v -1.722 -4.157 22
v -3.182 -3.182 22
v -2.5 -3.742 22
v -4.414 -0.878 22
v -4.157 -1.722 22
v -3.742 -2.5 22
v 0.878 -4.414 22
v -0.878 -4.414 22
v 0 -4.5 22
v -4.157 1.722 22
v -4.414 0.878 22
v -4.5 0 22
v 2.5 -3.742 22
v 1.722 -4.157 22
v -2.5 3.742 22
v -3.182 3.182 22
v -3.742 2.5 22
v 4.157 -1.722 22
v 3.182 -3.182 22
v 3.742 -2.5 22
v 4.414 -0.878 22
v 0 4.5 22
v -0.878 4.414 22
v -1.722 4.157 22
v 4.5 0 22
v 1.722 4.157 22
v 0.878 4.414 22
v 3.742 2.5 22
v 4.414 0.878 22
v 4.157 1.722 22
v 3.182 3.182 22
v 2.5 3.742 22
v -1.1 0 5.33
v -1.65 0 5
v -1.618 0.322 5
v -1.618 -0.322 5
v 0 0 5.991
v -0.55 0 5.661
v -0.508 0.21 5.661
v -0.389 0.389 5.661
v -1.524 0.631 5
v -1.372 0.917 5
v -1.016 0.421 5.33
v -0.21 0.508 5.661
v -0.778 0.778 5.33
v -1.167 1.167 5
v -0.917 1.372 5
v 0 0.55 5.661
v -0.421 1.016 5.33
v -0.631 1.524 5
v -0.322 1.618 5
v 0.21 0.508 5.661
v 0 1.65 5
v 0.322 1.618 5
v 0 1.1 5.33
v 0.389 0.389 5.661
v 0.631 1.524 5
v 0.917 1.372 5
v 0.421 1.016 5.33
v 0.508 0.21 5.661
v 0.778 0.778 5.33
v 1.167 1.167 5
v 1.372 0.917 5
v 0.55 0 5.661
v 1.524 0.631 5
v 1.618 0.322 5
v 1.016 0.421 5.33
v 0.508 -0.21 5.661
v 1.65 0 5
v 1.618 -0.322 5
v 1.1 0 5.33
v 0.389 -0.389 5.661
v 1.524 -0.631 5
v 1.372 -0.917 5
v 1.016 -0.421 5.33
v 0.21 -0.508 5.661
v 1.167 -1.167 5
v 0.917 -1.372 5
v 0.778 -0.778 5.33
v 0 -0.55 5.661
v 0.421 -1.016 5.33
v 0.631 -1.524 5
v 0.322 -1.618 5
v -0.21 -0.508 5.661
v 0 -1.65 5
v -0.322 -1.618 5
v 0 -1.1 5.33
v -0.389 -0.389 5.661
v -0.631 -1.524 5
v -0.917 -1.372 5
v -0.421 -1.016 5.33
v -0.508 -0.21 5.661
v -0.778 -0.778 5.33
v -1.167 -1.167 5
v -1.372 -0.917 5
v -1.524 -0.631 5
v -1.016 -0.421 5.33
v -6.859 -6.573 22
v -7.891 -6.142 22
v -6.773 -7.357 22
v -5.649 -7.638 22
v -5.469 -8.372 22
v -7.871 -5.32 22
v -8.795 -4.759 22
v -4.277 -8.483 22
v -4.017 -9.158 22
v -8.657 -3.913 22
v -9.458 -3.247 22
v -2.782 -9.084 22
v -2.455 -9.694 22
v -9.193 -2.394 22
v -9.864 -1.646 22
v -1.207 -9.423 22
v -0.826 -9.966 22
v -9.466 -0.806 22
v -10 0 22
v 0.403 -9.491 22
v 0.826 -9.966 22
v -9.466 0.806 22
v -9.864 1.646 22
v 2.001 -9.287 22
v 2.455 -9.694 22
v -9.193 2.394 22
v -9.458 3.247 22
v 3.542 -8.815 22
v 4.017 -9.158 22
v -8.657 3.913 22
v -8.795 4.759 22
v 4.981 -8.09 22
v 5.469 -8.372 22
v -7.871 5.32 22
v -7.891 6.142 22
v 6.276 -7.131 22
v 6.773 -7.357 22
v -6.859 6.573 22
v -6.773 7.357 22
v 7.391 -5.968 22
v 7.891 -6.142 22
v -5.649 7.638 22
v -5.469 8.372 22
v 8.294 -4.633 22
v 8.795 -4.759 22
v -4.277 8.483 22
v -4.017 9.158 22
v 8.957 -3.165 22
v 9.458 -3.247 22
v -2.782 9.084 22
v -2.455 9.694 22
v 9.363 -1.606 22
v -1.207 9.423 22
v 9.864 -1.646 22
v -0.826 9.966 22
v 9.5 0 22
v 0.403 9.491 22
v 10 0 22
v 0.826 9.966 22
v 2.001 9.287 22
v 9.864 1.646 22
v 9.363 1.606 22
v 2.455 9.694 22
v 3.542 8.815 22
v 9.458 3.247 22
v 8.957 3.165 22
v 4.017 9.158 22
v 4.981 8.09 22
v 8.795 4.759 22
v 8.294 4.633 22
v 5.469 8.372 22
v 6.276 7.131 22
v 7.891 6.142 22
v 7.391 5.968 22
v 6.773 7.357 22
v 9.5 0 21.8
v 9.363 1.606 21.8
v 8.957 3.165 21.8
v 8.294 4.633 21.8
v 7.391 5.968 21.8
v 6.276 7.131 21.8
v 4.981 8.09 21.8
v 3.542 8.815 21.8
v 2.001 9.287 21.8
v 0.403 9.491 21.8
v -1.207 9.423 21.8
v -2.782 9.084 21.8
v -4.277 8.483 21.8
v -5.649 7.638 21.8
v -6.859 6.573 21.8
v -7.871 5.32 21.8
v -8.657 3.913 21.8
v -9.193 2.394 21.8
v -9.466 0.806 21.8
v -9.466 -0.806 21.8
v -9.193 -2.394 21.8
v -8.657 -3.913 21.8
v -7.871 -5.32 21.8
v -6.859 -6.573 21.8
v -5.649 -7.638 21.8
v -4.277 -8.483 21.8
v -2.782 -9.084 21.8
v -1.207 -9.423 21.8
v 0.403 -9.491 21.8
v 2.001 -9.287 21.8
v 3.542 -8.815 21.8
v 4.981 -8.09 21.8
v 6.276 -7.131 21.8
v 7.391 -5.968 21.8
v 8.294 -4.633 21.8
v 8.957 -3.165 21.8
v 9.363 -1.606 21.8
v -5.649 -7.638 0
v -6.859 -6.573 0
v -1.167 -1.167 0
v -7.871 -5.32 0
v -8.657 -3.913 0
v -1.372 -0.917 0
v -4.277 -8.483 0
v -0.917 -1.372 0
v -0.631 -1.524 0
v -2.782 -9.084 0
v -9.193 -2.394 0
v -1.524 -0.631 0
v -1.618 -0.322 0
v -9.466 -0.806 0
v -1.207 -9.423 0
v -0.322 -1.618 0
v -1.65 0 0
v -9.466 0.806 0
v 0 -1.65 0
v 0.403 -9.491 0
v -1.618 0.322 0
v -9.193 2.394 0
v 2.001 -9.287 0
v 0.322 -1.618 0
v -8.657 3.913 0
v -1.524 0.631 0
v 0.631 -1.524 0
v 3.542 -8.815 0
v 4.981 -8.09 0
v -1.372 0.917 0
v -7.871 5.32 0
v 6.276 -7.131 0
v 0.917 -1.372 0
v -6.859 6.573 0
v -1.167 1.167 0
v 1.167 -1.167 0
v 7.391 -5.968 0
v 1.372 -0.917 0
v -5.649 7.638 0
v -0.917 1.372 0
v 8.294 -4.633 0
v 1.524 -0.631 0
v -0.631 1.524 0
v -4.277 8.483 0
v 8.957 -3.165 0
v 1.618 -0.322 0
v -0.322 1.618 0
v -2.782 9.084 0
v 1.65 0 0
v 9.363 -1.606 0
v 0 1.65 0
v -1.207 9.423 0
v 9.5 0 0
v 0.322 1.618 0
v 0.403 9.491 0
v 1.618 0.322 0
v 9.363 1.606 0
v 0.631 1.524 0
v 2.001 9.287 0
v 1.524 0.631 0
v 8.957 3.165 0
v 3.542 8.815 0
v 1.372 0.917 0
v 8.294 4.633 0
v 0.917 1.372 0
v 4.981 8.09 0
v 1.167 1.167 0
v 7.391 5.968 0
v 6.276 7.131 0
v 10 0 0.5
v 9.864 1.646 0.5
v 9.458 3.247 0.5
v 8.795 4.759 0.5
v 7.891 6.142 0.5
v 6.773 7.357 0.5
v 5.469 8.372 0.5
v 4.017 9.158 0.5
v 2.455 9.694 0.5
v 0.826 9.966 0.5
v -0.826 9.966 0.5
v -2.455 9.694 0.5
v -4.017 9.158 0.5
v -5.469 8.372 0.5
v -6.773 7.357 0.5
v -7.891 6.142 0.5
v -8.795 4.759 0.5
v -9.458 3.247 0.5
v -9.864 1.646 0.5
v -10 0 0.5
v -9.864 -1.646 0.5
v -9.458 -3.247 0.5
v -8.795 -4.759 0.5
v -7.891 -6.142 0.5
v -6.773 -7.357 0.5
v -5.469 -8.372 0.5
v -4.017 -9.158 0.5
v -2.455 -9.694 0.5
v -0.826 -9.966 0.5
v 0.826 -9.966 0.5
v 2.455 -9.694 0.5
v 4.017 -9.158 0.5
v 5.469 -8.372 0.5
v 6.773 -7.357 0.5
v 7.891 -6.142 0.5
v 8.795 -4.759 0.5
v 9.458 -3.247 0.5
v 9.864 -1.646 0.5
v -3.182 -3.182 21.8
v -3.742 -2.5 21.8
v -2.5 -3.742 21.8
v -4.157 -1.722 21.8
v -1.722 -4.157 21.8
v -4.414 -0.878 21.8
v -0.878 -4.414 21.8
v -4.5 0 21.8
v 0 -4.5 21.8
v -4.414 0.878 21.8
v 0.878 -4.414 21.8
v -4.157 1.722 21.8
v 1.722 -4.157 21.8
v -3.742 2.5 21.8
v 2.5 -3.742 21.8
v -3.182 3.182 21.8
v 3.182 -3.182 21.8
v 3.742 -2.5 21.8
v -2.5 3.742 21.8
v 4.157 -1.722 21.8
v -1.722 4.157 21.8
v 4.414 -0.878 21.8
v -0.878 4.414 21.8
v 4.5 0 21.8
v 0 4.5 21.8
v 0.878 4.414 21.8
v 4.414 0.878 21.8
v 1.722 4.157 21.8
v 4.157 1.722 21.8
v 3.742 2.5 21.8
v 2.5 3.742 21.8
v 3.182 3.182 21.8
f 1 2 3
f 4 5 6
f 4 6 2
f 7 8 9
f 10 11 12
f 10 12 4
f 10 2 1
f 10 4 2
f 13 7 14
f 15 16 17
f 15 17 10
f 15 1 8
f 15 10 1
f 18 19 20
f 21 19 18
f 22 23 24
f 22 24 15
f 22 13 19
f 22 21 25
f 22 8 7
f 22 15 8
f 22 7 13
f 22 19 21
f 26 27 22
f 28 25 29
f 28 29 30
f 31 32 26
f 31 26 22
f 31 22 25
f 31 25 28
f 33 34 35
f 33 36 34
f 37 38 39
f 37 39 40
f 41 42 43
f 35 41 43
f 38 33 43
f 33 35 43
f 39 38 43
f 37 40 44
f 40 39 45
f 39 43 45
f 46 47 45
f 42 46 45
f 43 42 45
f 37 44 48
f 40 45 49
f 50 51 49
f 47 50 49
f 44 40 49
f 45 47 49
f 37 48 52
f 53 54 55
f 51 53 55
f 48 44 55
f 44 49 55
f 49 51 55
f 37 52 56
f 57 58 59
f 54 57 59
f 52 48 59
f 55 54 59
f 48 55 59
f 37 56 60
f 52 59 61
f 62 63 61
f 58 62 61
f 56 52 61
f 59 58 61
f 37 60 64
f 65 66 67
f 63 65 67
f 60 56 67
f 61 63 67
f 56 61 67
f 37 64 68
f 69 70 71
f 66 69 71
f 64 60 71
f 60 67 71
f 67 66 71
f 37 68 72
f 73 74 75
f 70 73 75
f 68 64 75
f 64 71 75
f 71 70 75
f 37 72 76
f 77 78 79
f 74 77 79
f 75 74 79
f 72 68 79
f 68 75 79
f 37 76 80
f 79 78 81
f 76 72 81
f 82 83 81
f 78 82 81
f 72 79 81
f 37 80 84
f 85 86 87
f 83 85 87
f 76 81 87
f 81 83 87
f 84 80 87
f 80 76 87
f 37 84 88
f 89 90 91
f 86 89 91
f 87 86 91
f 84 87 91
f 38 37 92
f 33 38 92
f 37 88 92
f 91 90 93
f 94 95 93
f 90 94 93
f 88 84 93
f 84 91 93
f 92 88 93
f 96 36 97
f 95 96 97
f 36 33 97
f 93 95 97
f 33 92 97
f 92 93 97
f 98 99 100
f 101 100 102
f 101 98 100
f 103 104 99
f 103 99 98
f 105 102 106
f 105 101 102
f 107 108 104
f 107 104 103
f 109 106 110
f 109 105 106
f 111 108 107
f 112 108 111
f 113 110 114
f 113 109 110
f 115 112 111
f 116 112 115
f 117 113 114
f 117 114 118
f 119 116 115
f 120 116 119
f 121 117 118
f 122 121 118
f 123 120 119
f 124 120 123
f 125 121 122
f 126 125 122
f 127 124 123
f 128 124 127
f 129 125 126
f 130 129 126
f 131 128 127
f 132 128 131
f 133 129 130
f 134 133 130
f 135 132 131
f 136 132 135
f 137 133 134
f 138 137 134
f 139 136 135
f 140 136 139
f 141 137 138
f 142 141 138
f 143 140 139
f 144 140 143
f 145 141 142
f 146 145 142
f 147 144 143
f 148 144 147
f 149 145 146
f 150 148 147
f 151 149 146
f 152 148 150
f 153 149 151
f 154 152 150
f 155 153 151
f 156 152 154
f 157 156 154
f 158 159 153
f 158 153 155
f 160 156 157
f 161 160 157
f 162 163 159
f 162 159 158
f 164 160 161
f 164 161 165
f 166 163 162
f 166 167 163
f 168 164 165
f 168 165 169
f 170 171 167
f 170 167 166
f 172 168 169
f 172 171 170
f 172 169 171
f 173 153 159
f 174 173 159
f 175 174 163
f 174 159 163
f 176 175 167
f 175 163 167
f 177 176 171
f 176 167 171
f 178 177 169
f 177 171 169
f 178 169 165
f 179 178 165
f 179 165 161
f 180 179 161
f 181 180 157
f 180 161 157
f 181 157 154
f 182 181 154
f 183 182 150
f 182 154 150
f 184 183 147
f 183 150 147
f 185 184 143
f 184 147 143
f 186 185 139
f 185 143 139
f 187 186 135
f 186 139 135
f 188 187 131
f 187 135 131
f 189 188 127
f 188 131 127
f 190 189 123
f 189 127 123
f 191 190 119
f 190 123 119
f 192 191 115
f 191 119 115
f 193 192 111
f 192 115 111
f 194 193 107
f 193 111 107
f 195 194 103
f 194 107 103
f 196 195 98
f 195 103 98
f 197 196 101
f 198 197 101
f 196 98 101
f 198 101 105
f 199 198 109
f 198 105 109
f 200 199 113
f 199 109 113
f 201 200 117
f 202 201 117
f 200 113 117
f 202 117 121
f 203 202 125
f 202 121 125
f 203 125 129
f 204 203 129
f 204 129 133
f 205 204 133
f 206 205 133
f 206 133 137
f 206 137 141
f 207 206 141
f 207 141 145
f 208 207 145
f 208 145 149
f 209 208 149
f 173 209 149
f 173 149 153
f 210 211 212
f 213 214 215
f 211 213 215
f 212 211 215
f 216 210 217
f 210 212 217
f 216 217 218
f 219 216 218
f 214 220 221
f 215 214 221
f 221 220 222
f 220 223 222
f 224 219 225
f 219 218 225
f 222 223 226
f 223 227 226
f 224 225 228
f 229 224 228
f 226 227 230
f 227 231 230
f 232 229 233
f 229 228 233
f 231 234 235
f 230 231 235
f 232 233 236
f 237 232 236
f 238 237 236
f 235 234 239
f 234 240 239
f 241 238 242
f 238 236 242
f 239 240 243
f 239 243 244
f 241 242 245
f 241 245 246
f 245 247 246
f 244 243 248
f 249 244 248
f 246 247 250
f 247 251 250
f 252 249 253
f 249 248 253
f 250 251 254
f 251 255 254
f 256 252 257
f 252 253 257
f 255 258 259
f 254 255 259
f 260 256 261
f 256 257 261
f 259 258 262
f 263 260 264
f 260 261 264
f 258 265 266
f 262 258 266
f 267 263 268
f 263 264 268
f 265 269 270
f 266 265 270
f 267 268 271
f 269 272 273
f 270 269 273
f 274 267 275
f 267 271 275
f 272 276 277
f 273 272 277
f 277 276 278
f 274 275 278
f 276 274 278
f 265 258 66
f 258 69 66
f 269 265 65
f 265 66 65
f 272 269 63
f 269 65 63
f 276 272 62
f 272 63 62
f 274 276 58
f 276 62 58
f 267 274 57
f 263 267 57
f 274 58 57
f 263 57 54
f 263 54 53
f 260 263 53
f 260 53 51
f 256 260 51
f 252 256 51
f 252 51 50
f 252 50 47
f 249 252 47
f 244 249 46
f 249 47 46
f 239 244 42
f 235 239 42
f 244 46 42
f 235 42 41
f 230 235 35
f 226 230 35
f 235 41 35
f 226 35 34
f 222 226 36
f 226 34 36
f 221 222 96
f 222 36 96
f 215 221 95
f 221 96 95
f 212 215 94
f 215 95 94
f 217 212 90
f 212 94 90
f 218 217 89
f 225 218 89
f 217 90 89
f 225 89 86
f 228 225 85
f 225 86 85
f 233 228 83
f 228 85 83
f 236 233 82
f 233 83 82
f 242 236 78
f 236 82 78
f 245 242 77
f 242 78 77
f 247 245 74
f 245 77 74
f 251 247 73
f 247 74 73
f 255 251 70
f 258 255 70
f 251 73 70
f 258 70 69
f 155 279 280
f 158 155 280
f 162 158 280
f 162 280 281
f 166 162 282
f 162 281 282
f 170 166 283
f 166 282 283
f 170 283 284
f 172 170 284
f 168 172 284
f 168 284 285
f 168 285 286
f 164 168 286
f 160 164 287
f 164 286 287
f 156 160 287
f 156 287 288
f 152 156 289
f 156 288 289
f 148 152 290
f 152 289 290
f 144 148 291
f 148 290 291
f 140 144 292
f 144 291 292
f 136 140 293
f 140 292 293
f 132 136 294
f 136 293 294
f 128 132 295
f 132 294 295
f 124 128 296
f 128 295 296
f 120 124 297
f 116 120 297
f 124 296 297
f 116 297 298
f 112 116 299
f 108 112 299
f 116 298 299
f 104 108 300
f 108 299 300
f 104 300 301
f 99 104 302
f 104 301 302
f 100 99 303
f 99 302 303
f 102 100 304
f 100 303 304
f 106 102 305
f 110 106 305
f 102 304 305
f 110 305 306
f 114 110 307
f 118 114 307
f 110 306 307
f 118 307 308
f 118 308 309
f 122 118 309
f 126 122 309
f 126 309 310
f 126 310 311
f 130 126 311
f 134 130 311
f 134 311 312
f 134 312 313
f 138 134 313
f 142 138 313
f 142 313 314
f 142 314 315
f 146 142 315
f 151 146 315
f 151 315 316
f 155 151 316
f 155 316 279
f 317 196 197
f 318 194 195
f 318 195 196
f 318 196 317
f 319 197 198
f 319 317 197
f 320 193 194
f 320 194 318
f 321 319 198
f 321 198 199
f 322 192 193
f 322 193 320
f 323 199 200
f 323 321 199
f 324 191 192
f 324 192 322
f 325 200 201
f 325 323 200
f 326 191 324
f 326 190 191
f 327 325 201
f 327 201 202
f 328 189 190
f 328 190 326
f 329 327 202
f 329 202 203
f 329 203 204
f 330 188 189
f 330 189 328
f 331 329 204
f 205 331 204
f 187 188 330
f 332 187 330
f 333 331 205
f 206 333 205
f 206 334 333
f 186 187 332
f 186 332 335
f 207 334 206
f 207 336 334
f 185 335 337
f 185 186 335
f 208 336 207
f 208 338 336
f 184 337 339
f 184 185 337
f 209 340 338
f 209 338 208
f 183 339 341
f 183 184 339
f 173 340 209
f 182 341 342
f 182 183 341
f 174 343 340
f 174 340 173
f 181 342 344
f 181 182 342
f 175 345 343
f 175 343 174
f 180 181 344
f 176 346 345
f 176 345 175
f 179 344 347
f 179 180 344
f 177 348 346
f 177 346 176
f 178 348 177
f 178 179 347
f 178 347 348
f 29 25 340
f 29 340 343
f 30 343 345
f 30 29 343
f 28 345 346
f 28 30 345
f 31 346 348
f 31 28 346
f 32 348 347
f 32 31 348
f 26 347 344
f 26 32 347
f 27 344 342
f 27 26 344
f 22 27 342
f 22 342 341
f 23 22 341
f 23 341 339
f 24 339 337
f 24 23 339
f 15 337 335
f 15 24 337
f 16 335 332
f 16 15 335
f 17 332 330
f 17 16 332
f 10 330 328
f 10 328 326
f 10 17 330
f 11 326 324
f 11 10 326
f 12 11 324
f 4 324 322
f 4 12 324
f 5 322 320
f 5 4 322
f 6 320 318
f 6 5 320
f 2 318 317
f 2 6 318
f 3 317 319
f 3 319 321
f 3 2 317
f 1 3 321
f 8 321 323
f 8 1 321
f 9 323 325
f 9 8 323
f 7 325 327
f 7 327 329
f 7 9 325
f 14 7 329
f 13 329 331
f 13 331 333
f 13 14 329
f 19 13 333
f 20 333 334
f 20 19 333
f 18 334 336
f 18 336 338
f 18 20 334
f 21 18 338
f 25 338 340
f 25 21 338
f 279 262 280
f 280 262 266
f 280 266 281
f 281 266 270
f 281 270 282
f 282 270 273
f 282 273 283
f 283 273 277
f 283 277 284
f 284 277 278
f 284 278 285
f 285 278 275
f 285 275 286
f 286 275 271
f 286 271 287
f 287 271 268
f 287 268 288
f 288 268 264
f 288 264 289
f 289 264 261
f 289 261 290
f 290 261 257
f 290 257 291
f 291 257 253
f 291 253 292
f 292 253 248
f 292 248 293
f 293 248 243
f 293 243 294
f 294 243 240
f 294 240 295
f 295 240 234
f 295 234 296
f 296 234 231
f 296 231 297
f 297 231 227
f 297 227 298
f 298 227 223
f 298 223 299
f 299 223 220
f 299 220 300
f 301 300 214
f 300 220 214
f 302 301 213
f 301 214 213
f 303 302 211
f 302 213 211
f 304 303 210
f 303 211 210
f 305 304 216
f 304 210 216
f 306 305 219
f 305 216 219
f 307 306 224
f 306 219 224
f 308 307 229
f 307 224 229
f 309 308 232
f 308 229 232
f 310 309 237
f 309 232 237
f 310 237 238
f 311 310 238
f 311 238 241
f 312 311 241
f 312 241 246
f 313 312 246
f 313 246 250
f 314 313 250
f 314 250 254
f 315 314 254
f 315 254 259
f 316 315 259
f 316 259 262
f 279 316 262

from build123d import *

# Parameters (mm, degrees)
SKETCH1_R             = 10
BOSS_EXTRUDE1_DEPTH   = 22
SKETCH2_R             = 9.5
SKETCH2_R_2           = 4.5
CUT_EXTRUDE1_DEPTH    = 0.2
M4_TAPPED_HOLE1_D     = 3.3
M4_TAPPED_HOLE1_DEPTH = 5
M4_TAPPED_HOLE1_TIP   = 0.991420021
CHAMFER2_SIZE         = 0.5


with BuildPart() as part:
    # Sketch1 → Boss-Extrude1 (new body)
    with BuildSketch(Plane.XY):
        Circle(SKETCH1_R)
    extrude(amount=BOSS_EXTRUDE1_DEPTH)

    # Sketch2 → Cut-Extrude1 (cut)
    with BuildSketch(Plane.XY.offset(22)):
        Circle(SKETCH2_R)
        Circle(SKETCH2_R_2, mode=Mode.SUBTRACT)
    extrude(amount=-CUT_EXTRUDE1_DEPTH, mode=Mode.SUBTRACT)

    # M4 Tapped Hole1
    with Locations(Plane(origin=(0, 0, 0), x_dir=(-1, 0, 0), z_dir=(0, 0, -1))):
        with Locations((0, 0)):
            Hole(M4_TAPPED_HOLE1_D / 2, depth=M4_TAPPED_HOLE1_DEPTH)
            with Locations((0, 0, -(M4_TAPPED_HOLE1_DEPTH + M4_TAPPED_HOLE1_TIP / 2))):  # 118° drill point
                Cone(0, M4_TAPPED_HOLE1_D / 2, M4_TAPPED_HOLE1_TIP, mode=Mode.SUBTRACT)

    # Chamfer2
    chamfer2_edges = [part.edges().sort_by_distance(p)[0] for p in [
        (-10, 0, 0),
    ]]
    chamfer(chamfer2_edges, length=CHAMFER2_SIZE)


solid = part.part
